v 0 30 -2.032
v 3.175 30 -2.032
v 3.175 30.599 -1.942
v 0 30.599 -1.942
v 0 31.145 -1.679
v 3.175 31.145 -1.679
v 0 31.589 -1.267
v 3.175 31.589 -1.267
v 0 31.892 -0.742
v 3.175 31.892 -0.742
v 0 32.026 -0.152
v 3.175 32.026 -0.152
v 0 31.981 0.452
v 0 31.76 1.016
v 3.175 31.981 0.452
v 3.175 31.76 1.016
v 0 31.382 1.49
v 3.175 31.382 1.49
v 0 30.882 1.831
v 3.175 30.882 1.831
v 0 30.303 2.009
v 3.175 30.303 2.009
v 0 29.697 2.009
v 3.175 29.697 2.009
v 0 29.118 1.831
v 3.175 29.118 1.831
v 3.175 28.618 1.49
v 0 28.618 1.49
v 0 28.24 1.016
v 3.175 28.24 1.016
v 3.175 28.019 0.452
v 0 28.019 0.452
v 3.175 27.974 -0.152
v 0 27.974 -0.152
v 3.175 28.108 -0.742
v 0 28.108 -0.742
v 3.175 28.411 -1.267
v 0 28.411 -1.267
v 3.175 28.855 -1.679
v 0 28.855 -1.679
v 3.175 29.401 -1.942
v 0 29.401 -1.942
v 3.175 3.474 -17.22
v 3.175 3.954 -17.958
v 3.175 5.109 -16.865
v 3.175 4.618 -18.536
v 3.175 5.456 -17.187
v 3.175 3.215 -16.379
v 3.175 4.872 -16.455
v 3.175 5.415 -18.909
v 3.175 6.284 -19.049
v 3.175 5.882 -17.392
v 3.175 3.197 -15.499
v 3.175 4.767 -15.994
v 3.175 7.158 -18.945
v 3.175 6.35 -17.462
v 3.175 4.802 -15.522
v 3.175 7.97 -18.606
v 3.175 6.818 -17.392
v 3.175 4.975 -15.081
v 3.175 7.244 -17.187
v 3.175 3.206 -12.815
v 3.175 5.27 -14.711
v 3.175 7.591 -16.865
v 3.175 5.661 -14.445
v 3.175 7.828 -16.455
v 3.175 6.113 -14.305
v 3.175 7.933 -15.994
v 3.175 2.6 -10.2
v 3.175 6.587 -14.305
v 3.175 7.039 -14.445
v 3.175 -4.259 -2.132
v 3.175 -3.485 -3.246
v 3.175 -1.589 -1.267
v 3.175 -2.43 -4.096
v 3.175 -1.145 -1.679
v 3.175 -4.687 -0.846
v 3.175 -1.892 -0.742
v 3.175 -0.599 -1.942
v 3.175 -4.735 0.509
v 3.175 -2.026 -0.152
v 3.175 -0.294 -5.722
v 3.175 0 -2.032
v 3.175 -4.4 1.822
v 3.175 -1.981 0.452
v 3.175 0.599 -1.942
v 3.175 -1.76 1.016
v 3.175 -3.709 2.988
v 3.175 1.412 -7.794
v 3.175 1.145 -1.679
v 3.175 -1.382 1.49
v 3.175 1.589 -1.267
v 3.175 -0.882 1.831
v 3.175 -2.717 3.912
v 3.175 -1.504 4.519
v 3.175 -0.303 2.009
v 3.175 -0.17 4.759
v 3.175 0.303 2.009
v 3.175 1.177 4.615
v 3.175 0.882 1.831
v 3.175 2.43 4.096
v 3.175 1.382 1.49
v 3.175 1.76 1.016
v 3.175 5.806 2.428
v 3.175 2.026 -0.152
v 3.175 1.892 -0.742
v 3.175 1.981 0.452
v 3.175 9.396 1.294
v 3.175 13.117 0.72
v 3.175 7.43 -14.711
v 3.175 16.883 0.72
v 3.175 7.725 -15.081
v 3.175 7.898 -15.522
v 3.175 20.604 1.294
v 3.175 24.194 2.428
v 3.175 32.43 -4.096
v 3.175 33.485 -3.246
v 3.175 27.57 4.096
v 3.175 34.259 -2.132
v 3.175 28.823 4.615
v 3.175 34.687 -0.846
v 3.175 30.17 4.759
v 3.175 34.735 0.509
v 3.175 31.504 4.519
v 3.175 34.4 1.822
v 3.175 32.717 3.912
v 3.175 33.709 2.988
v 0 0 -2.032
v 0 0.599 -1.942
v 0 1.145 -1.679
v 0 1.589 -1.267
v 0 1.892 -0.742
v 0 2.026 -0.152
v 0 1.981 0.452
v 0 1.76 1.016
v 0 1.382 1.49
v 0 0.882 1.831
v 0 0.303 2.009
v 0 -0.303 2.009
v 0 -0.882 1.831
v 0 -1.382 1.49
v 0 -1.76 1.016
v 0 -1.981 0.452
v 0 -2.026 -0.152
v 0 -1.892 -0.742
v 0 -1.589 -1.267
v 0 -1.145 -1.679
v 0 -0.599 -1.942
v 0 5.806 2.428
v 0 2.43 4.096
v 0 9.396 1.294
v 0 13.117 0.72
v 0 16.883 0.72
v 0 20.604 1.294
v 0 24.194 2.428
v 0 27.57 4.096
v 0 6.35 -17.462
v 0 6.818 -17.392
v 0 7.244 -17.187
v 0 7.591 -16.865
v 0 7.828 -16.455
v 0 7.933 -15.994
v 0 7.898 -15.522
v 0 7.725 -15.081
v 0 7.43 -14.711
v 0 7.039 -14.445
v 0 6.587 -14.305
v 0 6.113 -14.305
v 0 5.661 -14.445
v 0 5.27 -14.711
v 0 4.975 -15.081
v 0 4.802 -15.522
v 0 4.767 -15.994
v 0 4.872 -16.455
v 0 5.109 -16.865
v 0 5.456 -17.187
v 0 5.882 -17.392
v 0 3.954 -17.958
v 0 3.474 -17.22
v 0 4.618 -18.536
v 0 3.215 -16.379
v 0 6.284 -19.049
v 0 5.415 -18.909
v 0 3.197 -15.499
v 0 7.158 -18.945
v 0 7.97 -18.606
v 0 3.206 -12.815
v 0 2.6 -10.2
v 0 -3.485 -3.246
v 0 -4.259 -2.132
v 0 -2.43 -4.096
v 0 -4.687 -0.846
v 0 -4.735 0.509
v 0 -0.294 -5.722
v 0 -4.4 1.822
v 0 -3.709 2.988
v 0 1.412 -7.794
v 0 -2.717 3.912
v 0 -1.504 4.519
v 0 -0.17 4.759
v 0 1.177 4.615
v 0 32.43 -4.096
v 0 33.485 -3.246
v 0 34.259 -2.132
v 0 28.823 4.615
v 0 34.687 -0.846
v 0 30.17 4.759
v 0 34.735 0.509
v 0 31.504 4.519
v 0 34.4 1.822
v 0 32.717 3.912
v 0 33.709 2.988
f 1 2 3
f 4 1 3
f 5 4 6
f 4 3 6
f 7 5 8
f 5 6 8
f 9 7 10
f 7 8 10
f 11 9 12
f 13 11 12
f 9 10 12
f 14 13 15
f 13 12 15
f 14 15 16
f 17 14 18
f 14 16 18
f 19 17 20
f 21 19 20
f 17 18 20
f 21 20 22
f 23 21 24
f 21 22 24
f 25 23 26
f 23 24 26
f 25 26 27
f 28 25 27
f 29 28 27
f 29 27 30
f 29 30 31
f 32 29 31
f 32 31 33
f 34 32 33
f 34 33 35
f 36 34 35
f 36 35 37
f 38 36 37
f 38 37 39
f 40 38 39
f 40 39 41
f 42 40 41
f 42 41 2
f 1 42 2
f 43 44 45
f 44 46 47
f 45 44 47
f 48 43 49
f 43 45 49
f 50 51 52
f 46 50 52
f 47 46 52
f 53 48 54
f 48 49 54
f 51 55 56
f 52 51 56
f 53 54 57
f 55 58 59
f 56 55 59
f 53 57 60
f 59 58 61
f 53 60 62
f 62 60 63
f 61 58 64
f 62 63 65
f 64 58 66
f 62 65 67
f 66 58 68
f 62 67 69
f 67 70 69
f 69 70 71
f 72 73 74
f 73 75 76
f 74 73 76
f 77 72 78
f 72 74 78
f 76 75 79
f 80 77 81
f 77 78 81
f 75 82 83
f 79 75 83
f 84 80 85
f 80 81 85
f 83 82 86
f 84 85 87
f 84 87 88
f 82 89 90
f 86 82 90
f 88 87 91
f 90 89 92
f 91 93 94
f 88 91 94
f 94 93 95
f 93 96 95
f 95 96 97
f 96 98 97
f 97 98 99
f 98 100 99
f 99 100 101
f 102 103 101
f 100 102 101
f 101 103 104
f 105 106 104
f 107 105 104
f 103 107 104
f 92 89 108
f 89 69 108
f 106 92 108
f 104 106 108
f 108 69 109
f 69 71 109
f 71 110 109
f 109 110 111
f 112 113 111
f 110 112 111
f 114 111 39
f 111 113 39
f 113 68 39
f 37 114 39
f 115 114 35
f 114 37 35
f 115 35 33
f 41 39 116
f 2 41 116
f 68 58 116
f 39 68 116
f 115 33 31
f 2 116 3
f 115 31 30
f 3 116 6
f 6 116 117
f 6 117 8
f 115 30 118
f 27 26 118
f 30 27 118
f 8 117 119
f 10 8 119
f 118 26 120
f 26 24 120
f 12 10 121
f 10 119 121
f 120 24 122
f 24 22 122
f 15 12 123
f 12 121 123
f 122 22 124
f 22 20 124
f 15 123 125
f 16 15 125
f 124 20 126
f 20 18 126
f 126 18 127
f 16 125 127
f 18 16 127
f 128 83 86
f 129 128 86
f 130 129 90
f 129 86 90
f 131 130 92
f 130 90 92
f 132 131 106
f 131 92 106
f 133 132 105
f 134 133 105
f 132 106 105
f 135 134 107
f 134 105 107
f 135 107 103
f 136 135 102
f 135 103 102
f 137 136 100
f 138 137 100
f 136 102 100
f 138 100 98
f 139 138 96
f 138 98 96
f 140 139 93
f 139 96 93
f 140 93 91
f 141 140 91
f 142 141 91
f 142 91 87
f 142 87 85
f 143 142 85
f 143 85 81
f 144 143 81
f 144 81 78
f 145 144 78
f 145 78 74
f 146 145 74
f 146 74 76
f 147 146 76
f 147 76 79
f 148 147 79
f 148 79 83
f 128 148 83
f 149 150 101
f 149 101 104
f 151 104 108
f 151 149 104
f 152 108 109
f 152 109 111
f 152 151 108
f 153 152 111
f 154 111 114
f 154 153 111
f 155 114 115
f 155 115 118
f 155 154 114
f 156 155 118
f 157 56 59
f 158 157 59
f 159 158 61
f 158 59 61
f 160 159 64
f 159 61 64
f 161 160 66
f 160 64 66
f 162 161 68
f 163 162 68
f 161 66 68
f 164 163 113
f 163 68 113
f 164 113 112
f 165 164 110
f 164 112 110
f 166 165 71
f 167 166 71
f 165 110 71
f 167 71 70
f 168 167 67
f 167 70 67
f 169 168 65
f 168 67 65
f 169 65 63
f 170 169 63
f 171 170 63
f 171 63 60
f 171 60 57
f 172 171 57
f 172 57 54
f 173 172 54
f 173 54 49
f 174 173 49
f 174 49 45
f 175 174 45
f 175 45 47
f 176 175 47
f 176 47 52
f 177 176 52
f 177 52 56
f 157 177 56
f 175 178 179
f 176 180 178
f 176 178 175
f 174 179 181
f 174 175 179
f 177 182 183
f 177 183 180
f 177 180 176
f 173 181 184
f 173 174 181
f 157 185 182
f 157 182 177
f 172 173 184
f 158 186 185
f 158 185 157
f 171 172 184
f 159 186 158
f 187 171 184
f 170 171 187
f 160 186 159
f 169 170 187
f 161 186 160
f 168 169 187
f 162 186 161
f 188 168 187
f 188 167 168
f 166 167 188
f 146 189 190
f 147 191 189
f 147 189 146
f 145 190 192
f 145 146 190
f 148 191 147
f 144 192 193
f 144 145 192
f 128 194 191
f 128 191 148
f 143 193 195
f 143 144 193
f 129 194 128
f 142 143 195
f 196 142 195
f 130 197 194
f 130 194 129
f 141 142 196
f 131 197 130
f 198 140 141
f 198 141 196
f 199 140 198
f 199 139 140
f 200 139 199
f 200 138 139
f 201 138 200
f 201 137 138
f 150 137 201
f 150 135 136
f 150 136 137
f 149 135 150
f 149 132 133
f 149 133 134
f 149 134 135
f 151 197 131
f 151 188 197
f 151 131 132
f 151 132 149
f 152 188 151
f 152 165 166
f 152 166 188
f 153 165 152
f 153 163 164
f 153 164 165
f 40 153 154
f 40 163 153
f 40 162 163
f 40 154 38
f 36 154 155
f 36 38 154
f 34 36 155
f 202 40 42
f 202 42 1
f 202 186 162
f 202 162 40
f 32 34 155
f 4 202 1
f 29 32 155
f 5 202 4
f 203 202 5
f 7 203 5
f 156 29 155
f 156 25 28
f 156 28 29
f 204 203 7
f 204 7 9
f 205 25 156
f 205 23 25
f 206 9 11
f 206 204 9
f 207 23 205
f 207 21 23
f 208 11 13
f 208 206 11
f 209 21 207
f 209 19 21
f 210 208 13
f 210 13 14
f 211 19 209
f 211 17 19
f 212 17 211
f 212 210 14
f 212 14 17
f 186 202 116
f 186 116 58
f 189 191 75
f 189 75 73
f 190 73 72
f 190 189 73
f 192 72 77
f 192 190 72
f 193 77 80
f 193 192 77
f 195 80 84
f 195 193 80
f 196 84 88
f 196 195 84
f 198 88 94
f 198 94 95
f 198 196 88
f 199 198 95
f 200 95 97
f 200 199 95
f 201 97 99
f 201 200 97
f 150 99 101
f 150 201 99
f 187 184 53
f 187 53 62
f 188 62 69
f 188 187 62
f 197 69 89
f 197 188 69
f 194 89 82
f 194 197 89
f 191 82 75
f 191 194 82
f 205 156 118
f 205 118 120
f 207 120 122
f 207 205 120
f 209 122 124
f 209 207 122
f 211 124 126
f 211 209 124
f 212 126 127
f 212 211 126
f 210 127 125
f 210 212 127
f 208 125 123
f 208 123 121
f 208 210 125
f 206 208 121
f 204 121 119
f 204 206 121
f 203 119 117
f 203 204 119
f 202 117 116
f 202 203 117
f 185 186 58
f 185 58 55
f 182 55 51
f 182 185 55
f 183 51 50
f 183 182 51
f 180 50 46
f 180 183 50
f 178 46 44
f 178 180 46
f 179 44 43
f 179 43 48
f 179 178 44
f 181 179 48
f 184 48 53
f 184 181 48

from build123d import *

# Parameters (mm, degrees)
BOSS_EXTRUDE1_DEPTH = 3.175
SKETCH2_R           = 2.032
SKETCH2_R_2         = 1.5875
CUT_EXTRUDE1_DEPTH  = 40.767003046


with BuildPart() as part:
    # Sketch1 → Boss-Extrude1 (new body)
    with BuildSketch(Plane(origin=(0, 0, 0), x_dir=(0, 0, -1), z_dir=(1, 0, 0))):
        with BuildLine():
            Line((4.096045115, 32.429777905), (18.605696743, 7.969851937))
            ThreePointArc((18.605696743, 7.969851937), (18.535994972, 4.618026917), (15.499364997, 3.19729904))
            ThreePointArc((15.499364997, 3.19729904), (8.962719261, 2.075866472), (4.096045115, -2.429777905))
            ThreePointArc((4.096045115, -2.429777905), (-2.429777905, -4.096045115), (-4.096045115, 2.429777905))
            ThreePointArc((-4.096045115, 2.429777905), (-0.648204921, 15), (-4.096045115, 27.570222095))
            ThreePointArc((-4.096045115, 27.570222095), (-2.429777905, 34.096045115), (4.096045115, 32.429777905))
        make_face()
    extrude(amount=BOSS_EXTRUDE1_DEPTH)

    # Sketch2 → Cut-Extrude1 (cut, through all)
    with BuildSketch(Plane(origin=(3.175, 0, 0), x_dir=(0, 0, -1), z_dir=(1, 0, 0))):
        with Locations((0, 30)):
            Circle(SKETCH2_R)
        Circle(SKETCH2_R)
        with Locations((15.875, 6.35)):
            Circle(SKETCH2_R_2)
    extrude(amount=-CUT_EXTRUDE1_DEPTH, mode=Mode.SUBTRACT)


solid = part.part
